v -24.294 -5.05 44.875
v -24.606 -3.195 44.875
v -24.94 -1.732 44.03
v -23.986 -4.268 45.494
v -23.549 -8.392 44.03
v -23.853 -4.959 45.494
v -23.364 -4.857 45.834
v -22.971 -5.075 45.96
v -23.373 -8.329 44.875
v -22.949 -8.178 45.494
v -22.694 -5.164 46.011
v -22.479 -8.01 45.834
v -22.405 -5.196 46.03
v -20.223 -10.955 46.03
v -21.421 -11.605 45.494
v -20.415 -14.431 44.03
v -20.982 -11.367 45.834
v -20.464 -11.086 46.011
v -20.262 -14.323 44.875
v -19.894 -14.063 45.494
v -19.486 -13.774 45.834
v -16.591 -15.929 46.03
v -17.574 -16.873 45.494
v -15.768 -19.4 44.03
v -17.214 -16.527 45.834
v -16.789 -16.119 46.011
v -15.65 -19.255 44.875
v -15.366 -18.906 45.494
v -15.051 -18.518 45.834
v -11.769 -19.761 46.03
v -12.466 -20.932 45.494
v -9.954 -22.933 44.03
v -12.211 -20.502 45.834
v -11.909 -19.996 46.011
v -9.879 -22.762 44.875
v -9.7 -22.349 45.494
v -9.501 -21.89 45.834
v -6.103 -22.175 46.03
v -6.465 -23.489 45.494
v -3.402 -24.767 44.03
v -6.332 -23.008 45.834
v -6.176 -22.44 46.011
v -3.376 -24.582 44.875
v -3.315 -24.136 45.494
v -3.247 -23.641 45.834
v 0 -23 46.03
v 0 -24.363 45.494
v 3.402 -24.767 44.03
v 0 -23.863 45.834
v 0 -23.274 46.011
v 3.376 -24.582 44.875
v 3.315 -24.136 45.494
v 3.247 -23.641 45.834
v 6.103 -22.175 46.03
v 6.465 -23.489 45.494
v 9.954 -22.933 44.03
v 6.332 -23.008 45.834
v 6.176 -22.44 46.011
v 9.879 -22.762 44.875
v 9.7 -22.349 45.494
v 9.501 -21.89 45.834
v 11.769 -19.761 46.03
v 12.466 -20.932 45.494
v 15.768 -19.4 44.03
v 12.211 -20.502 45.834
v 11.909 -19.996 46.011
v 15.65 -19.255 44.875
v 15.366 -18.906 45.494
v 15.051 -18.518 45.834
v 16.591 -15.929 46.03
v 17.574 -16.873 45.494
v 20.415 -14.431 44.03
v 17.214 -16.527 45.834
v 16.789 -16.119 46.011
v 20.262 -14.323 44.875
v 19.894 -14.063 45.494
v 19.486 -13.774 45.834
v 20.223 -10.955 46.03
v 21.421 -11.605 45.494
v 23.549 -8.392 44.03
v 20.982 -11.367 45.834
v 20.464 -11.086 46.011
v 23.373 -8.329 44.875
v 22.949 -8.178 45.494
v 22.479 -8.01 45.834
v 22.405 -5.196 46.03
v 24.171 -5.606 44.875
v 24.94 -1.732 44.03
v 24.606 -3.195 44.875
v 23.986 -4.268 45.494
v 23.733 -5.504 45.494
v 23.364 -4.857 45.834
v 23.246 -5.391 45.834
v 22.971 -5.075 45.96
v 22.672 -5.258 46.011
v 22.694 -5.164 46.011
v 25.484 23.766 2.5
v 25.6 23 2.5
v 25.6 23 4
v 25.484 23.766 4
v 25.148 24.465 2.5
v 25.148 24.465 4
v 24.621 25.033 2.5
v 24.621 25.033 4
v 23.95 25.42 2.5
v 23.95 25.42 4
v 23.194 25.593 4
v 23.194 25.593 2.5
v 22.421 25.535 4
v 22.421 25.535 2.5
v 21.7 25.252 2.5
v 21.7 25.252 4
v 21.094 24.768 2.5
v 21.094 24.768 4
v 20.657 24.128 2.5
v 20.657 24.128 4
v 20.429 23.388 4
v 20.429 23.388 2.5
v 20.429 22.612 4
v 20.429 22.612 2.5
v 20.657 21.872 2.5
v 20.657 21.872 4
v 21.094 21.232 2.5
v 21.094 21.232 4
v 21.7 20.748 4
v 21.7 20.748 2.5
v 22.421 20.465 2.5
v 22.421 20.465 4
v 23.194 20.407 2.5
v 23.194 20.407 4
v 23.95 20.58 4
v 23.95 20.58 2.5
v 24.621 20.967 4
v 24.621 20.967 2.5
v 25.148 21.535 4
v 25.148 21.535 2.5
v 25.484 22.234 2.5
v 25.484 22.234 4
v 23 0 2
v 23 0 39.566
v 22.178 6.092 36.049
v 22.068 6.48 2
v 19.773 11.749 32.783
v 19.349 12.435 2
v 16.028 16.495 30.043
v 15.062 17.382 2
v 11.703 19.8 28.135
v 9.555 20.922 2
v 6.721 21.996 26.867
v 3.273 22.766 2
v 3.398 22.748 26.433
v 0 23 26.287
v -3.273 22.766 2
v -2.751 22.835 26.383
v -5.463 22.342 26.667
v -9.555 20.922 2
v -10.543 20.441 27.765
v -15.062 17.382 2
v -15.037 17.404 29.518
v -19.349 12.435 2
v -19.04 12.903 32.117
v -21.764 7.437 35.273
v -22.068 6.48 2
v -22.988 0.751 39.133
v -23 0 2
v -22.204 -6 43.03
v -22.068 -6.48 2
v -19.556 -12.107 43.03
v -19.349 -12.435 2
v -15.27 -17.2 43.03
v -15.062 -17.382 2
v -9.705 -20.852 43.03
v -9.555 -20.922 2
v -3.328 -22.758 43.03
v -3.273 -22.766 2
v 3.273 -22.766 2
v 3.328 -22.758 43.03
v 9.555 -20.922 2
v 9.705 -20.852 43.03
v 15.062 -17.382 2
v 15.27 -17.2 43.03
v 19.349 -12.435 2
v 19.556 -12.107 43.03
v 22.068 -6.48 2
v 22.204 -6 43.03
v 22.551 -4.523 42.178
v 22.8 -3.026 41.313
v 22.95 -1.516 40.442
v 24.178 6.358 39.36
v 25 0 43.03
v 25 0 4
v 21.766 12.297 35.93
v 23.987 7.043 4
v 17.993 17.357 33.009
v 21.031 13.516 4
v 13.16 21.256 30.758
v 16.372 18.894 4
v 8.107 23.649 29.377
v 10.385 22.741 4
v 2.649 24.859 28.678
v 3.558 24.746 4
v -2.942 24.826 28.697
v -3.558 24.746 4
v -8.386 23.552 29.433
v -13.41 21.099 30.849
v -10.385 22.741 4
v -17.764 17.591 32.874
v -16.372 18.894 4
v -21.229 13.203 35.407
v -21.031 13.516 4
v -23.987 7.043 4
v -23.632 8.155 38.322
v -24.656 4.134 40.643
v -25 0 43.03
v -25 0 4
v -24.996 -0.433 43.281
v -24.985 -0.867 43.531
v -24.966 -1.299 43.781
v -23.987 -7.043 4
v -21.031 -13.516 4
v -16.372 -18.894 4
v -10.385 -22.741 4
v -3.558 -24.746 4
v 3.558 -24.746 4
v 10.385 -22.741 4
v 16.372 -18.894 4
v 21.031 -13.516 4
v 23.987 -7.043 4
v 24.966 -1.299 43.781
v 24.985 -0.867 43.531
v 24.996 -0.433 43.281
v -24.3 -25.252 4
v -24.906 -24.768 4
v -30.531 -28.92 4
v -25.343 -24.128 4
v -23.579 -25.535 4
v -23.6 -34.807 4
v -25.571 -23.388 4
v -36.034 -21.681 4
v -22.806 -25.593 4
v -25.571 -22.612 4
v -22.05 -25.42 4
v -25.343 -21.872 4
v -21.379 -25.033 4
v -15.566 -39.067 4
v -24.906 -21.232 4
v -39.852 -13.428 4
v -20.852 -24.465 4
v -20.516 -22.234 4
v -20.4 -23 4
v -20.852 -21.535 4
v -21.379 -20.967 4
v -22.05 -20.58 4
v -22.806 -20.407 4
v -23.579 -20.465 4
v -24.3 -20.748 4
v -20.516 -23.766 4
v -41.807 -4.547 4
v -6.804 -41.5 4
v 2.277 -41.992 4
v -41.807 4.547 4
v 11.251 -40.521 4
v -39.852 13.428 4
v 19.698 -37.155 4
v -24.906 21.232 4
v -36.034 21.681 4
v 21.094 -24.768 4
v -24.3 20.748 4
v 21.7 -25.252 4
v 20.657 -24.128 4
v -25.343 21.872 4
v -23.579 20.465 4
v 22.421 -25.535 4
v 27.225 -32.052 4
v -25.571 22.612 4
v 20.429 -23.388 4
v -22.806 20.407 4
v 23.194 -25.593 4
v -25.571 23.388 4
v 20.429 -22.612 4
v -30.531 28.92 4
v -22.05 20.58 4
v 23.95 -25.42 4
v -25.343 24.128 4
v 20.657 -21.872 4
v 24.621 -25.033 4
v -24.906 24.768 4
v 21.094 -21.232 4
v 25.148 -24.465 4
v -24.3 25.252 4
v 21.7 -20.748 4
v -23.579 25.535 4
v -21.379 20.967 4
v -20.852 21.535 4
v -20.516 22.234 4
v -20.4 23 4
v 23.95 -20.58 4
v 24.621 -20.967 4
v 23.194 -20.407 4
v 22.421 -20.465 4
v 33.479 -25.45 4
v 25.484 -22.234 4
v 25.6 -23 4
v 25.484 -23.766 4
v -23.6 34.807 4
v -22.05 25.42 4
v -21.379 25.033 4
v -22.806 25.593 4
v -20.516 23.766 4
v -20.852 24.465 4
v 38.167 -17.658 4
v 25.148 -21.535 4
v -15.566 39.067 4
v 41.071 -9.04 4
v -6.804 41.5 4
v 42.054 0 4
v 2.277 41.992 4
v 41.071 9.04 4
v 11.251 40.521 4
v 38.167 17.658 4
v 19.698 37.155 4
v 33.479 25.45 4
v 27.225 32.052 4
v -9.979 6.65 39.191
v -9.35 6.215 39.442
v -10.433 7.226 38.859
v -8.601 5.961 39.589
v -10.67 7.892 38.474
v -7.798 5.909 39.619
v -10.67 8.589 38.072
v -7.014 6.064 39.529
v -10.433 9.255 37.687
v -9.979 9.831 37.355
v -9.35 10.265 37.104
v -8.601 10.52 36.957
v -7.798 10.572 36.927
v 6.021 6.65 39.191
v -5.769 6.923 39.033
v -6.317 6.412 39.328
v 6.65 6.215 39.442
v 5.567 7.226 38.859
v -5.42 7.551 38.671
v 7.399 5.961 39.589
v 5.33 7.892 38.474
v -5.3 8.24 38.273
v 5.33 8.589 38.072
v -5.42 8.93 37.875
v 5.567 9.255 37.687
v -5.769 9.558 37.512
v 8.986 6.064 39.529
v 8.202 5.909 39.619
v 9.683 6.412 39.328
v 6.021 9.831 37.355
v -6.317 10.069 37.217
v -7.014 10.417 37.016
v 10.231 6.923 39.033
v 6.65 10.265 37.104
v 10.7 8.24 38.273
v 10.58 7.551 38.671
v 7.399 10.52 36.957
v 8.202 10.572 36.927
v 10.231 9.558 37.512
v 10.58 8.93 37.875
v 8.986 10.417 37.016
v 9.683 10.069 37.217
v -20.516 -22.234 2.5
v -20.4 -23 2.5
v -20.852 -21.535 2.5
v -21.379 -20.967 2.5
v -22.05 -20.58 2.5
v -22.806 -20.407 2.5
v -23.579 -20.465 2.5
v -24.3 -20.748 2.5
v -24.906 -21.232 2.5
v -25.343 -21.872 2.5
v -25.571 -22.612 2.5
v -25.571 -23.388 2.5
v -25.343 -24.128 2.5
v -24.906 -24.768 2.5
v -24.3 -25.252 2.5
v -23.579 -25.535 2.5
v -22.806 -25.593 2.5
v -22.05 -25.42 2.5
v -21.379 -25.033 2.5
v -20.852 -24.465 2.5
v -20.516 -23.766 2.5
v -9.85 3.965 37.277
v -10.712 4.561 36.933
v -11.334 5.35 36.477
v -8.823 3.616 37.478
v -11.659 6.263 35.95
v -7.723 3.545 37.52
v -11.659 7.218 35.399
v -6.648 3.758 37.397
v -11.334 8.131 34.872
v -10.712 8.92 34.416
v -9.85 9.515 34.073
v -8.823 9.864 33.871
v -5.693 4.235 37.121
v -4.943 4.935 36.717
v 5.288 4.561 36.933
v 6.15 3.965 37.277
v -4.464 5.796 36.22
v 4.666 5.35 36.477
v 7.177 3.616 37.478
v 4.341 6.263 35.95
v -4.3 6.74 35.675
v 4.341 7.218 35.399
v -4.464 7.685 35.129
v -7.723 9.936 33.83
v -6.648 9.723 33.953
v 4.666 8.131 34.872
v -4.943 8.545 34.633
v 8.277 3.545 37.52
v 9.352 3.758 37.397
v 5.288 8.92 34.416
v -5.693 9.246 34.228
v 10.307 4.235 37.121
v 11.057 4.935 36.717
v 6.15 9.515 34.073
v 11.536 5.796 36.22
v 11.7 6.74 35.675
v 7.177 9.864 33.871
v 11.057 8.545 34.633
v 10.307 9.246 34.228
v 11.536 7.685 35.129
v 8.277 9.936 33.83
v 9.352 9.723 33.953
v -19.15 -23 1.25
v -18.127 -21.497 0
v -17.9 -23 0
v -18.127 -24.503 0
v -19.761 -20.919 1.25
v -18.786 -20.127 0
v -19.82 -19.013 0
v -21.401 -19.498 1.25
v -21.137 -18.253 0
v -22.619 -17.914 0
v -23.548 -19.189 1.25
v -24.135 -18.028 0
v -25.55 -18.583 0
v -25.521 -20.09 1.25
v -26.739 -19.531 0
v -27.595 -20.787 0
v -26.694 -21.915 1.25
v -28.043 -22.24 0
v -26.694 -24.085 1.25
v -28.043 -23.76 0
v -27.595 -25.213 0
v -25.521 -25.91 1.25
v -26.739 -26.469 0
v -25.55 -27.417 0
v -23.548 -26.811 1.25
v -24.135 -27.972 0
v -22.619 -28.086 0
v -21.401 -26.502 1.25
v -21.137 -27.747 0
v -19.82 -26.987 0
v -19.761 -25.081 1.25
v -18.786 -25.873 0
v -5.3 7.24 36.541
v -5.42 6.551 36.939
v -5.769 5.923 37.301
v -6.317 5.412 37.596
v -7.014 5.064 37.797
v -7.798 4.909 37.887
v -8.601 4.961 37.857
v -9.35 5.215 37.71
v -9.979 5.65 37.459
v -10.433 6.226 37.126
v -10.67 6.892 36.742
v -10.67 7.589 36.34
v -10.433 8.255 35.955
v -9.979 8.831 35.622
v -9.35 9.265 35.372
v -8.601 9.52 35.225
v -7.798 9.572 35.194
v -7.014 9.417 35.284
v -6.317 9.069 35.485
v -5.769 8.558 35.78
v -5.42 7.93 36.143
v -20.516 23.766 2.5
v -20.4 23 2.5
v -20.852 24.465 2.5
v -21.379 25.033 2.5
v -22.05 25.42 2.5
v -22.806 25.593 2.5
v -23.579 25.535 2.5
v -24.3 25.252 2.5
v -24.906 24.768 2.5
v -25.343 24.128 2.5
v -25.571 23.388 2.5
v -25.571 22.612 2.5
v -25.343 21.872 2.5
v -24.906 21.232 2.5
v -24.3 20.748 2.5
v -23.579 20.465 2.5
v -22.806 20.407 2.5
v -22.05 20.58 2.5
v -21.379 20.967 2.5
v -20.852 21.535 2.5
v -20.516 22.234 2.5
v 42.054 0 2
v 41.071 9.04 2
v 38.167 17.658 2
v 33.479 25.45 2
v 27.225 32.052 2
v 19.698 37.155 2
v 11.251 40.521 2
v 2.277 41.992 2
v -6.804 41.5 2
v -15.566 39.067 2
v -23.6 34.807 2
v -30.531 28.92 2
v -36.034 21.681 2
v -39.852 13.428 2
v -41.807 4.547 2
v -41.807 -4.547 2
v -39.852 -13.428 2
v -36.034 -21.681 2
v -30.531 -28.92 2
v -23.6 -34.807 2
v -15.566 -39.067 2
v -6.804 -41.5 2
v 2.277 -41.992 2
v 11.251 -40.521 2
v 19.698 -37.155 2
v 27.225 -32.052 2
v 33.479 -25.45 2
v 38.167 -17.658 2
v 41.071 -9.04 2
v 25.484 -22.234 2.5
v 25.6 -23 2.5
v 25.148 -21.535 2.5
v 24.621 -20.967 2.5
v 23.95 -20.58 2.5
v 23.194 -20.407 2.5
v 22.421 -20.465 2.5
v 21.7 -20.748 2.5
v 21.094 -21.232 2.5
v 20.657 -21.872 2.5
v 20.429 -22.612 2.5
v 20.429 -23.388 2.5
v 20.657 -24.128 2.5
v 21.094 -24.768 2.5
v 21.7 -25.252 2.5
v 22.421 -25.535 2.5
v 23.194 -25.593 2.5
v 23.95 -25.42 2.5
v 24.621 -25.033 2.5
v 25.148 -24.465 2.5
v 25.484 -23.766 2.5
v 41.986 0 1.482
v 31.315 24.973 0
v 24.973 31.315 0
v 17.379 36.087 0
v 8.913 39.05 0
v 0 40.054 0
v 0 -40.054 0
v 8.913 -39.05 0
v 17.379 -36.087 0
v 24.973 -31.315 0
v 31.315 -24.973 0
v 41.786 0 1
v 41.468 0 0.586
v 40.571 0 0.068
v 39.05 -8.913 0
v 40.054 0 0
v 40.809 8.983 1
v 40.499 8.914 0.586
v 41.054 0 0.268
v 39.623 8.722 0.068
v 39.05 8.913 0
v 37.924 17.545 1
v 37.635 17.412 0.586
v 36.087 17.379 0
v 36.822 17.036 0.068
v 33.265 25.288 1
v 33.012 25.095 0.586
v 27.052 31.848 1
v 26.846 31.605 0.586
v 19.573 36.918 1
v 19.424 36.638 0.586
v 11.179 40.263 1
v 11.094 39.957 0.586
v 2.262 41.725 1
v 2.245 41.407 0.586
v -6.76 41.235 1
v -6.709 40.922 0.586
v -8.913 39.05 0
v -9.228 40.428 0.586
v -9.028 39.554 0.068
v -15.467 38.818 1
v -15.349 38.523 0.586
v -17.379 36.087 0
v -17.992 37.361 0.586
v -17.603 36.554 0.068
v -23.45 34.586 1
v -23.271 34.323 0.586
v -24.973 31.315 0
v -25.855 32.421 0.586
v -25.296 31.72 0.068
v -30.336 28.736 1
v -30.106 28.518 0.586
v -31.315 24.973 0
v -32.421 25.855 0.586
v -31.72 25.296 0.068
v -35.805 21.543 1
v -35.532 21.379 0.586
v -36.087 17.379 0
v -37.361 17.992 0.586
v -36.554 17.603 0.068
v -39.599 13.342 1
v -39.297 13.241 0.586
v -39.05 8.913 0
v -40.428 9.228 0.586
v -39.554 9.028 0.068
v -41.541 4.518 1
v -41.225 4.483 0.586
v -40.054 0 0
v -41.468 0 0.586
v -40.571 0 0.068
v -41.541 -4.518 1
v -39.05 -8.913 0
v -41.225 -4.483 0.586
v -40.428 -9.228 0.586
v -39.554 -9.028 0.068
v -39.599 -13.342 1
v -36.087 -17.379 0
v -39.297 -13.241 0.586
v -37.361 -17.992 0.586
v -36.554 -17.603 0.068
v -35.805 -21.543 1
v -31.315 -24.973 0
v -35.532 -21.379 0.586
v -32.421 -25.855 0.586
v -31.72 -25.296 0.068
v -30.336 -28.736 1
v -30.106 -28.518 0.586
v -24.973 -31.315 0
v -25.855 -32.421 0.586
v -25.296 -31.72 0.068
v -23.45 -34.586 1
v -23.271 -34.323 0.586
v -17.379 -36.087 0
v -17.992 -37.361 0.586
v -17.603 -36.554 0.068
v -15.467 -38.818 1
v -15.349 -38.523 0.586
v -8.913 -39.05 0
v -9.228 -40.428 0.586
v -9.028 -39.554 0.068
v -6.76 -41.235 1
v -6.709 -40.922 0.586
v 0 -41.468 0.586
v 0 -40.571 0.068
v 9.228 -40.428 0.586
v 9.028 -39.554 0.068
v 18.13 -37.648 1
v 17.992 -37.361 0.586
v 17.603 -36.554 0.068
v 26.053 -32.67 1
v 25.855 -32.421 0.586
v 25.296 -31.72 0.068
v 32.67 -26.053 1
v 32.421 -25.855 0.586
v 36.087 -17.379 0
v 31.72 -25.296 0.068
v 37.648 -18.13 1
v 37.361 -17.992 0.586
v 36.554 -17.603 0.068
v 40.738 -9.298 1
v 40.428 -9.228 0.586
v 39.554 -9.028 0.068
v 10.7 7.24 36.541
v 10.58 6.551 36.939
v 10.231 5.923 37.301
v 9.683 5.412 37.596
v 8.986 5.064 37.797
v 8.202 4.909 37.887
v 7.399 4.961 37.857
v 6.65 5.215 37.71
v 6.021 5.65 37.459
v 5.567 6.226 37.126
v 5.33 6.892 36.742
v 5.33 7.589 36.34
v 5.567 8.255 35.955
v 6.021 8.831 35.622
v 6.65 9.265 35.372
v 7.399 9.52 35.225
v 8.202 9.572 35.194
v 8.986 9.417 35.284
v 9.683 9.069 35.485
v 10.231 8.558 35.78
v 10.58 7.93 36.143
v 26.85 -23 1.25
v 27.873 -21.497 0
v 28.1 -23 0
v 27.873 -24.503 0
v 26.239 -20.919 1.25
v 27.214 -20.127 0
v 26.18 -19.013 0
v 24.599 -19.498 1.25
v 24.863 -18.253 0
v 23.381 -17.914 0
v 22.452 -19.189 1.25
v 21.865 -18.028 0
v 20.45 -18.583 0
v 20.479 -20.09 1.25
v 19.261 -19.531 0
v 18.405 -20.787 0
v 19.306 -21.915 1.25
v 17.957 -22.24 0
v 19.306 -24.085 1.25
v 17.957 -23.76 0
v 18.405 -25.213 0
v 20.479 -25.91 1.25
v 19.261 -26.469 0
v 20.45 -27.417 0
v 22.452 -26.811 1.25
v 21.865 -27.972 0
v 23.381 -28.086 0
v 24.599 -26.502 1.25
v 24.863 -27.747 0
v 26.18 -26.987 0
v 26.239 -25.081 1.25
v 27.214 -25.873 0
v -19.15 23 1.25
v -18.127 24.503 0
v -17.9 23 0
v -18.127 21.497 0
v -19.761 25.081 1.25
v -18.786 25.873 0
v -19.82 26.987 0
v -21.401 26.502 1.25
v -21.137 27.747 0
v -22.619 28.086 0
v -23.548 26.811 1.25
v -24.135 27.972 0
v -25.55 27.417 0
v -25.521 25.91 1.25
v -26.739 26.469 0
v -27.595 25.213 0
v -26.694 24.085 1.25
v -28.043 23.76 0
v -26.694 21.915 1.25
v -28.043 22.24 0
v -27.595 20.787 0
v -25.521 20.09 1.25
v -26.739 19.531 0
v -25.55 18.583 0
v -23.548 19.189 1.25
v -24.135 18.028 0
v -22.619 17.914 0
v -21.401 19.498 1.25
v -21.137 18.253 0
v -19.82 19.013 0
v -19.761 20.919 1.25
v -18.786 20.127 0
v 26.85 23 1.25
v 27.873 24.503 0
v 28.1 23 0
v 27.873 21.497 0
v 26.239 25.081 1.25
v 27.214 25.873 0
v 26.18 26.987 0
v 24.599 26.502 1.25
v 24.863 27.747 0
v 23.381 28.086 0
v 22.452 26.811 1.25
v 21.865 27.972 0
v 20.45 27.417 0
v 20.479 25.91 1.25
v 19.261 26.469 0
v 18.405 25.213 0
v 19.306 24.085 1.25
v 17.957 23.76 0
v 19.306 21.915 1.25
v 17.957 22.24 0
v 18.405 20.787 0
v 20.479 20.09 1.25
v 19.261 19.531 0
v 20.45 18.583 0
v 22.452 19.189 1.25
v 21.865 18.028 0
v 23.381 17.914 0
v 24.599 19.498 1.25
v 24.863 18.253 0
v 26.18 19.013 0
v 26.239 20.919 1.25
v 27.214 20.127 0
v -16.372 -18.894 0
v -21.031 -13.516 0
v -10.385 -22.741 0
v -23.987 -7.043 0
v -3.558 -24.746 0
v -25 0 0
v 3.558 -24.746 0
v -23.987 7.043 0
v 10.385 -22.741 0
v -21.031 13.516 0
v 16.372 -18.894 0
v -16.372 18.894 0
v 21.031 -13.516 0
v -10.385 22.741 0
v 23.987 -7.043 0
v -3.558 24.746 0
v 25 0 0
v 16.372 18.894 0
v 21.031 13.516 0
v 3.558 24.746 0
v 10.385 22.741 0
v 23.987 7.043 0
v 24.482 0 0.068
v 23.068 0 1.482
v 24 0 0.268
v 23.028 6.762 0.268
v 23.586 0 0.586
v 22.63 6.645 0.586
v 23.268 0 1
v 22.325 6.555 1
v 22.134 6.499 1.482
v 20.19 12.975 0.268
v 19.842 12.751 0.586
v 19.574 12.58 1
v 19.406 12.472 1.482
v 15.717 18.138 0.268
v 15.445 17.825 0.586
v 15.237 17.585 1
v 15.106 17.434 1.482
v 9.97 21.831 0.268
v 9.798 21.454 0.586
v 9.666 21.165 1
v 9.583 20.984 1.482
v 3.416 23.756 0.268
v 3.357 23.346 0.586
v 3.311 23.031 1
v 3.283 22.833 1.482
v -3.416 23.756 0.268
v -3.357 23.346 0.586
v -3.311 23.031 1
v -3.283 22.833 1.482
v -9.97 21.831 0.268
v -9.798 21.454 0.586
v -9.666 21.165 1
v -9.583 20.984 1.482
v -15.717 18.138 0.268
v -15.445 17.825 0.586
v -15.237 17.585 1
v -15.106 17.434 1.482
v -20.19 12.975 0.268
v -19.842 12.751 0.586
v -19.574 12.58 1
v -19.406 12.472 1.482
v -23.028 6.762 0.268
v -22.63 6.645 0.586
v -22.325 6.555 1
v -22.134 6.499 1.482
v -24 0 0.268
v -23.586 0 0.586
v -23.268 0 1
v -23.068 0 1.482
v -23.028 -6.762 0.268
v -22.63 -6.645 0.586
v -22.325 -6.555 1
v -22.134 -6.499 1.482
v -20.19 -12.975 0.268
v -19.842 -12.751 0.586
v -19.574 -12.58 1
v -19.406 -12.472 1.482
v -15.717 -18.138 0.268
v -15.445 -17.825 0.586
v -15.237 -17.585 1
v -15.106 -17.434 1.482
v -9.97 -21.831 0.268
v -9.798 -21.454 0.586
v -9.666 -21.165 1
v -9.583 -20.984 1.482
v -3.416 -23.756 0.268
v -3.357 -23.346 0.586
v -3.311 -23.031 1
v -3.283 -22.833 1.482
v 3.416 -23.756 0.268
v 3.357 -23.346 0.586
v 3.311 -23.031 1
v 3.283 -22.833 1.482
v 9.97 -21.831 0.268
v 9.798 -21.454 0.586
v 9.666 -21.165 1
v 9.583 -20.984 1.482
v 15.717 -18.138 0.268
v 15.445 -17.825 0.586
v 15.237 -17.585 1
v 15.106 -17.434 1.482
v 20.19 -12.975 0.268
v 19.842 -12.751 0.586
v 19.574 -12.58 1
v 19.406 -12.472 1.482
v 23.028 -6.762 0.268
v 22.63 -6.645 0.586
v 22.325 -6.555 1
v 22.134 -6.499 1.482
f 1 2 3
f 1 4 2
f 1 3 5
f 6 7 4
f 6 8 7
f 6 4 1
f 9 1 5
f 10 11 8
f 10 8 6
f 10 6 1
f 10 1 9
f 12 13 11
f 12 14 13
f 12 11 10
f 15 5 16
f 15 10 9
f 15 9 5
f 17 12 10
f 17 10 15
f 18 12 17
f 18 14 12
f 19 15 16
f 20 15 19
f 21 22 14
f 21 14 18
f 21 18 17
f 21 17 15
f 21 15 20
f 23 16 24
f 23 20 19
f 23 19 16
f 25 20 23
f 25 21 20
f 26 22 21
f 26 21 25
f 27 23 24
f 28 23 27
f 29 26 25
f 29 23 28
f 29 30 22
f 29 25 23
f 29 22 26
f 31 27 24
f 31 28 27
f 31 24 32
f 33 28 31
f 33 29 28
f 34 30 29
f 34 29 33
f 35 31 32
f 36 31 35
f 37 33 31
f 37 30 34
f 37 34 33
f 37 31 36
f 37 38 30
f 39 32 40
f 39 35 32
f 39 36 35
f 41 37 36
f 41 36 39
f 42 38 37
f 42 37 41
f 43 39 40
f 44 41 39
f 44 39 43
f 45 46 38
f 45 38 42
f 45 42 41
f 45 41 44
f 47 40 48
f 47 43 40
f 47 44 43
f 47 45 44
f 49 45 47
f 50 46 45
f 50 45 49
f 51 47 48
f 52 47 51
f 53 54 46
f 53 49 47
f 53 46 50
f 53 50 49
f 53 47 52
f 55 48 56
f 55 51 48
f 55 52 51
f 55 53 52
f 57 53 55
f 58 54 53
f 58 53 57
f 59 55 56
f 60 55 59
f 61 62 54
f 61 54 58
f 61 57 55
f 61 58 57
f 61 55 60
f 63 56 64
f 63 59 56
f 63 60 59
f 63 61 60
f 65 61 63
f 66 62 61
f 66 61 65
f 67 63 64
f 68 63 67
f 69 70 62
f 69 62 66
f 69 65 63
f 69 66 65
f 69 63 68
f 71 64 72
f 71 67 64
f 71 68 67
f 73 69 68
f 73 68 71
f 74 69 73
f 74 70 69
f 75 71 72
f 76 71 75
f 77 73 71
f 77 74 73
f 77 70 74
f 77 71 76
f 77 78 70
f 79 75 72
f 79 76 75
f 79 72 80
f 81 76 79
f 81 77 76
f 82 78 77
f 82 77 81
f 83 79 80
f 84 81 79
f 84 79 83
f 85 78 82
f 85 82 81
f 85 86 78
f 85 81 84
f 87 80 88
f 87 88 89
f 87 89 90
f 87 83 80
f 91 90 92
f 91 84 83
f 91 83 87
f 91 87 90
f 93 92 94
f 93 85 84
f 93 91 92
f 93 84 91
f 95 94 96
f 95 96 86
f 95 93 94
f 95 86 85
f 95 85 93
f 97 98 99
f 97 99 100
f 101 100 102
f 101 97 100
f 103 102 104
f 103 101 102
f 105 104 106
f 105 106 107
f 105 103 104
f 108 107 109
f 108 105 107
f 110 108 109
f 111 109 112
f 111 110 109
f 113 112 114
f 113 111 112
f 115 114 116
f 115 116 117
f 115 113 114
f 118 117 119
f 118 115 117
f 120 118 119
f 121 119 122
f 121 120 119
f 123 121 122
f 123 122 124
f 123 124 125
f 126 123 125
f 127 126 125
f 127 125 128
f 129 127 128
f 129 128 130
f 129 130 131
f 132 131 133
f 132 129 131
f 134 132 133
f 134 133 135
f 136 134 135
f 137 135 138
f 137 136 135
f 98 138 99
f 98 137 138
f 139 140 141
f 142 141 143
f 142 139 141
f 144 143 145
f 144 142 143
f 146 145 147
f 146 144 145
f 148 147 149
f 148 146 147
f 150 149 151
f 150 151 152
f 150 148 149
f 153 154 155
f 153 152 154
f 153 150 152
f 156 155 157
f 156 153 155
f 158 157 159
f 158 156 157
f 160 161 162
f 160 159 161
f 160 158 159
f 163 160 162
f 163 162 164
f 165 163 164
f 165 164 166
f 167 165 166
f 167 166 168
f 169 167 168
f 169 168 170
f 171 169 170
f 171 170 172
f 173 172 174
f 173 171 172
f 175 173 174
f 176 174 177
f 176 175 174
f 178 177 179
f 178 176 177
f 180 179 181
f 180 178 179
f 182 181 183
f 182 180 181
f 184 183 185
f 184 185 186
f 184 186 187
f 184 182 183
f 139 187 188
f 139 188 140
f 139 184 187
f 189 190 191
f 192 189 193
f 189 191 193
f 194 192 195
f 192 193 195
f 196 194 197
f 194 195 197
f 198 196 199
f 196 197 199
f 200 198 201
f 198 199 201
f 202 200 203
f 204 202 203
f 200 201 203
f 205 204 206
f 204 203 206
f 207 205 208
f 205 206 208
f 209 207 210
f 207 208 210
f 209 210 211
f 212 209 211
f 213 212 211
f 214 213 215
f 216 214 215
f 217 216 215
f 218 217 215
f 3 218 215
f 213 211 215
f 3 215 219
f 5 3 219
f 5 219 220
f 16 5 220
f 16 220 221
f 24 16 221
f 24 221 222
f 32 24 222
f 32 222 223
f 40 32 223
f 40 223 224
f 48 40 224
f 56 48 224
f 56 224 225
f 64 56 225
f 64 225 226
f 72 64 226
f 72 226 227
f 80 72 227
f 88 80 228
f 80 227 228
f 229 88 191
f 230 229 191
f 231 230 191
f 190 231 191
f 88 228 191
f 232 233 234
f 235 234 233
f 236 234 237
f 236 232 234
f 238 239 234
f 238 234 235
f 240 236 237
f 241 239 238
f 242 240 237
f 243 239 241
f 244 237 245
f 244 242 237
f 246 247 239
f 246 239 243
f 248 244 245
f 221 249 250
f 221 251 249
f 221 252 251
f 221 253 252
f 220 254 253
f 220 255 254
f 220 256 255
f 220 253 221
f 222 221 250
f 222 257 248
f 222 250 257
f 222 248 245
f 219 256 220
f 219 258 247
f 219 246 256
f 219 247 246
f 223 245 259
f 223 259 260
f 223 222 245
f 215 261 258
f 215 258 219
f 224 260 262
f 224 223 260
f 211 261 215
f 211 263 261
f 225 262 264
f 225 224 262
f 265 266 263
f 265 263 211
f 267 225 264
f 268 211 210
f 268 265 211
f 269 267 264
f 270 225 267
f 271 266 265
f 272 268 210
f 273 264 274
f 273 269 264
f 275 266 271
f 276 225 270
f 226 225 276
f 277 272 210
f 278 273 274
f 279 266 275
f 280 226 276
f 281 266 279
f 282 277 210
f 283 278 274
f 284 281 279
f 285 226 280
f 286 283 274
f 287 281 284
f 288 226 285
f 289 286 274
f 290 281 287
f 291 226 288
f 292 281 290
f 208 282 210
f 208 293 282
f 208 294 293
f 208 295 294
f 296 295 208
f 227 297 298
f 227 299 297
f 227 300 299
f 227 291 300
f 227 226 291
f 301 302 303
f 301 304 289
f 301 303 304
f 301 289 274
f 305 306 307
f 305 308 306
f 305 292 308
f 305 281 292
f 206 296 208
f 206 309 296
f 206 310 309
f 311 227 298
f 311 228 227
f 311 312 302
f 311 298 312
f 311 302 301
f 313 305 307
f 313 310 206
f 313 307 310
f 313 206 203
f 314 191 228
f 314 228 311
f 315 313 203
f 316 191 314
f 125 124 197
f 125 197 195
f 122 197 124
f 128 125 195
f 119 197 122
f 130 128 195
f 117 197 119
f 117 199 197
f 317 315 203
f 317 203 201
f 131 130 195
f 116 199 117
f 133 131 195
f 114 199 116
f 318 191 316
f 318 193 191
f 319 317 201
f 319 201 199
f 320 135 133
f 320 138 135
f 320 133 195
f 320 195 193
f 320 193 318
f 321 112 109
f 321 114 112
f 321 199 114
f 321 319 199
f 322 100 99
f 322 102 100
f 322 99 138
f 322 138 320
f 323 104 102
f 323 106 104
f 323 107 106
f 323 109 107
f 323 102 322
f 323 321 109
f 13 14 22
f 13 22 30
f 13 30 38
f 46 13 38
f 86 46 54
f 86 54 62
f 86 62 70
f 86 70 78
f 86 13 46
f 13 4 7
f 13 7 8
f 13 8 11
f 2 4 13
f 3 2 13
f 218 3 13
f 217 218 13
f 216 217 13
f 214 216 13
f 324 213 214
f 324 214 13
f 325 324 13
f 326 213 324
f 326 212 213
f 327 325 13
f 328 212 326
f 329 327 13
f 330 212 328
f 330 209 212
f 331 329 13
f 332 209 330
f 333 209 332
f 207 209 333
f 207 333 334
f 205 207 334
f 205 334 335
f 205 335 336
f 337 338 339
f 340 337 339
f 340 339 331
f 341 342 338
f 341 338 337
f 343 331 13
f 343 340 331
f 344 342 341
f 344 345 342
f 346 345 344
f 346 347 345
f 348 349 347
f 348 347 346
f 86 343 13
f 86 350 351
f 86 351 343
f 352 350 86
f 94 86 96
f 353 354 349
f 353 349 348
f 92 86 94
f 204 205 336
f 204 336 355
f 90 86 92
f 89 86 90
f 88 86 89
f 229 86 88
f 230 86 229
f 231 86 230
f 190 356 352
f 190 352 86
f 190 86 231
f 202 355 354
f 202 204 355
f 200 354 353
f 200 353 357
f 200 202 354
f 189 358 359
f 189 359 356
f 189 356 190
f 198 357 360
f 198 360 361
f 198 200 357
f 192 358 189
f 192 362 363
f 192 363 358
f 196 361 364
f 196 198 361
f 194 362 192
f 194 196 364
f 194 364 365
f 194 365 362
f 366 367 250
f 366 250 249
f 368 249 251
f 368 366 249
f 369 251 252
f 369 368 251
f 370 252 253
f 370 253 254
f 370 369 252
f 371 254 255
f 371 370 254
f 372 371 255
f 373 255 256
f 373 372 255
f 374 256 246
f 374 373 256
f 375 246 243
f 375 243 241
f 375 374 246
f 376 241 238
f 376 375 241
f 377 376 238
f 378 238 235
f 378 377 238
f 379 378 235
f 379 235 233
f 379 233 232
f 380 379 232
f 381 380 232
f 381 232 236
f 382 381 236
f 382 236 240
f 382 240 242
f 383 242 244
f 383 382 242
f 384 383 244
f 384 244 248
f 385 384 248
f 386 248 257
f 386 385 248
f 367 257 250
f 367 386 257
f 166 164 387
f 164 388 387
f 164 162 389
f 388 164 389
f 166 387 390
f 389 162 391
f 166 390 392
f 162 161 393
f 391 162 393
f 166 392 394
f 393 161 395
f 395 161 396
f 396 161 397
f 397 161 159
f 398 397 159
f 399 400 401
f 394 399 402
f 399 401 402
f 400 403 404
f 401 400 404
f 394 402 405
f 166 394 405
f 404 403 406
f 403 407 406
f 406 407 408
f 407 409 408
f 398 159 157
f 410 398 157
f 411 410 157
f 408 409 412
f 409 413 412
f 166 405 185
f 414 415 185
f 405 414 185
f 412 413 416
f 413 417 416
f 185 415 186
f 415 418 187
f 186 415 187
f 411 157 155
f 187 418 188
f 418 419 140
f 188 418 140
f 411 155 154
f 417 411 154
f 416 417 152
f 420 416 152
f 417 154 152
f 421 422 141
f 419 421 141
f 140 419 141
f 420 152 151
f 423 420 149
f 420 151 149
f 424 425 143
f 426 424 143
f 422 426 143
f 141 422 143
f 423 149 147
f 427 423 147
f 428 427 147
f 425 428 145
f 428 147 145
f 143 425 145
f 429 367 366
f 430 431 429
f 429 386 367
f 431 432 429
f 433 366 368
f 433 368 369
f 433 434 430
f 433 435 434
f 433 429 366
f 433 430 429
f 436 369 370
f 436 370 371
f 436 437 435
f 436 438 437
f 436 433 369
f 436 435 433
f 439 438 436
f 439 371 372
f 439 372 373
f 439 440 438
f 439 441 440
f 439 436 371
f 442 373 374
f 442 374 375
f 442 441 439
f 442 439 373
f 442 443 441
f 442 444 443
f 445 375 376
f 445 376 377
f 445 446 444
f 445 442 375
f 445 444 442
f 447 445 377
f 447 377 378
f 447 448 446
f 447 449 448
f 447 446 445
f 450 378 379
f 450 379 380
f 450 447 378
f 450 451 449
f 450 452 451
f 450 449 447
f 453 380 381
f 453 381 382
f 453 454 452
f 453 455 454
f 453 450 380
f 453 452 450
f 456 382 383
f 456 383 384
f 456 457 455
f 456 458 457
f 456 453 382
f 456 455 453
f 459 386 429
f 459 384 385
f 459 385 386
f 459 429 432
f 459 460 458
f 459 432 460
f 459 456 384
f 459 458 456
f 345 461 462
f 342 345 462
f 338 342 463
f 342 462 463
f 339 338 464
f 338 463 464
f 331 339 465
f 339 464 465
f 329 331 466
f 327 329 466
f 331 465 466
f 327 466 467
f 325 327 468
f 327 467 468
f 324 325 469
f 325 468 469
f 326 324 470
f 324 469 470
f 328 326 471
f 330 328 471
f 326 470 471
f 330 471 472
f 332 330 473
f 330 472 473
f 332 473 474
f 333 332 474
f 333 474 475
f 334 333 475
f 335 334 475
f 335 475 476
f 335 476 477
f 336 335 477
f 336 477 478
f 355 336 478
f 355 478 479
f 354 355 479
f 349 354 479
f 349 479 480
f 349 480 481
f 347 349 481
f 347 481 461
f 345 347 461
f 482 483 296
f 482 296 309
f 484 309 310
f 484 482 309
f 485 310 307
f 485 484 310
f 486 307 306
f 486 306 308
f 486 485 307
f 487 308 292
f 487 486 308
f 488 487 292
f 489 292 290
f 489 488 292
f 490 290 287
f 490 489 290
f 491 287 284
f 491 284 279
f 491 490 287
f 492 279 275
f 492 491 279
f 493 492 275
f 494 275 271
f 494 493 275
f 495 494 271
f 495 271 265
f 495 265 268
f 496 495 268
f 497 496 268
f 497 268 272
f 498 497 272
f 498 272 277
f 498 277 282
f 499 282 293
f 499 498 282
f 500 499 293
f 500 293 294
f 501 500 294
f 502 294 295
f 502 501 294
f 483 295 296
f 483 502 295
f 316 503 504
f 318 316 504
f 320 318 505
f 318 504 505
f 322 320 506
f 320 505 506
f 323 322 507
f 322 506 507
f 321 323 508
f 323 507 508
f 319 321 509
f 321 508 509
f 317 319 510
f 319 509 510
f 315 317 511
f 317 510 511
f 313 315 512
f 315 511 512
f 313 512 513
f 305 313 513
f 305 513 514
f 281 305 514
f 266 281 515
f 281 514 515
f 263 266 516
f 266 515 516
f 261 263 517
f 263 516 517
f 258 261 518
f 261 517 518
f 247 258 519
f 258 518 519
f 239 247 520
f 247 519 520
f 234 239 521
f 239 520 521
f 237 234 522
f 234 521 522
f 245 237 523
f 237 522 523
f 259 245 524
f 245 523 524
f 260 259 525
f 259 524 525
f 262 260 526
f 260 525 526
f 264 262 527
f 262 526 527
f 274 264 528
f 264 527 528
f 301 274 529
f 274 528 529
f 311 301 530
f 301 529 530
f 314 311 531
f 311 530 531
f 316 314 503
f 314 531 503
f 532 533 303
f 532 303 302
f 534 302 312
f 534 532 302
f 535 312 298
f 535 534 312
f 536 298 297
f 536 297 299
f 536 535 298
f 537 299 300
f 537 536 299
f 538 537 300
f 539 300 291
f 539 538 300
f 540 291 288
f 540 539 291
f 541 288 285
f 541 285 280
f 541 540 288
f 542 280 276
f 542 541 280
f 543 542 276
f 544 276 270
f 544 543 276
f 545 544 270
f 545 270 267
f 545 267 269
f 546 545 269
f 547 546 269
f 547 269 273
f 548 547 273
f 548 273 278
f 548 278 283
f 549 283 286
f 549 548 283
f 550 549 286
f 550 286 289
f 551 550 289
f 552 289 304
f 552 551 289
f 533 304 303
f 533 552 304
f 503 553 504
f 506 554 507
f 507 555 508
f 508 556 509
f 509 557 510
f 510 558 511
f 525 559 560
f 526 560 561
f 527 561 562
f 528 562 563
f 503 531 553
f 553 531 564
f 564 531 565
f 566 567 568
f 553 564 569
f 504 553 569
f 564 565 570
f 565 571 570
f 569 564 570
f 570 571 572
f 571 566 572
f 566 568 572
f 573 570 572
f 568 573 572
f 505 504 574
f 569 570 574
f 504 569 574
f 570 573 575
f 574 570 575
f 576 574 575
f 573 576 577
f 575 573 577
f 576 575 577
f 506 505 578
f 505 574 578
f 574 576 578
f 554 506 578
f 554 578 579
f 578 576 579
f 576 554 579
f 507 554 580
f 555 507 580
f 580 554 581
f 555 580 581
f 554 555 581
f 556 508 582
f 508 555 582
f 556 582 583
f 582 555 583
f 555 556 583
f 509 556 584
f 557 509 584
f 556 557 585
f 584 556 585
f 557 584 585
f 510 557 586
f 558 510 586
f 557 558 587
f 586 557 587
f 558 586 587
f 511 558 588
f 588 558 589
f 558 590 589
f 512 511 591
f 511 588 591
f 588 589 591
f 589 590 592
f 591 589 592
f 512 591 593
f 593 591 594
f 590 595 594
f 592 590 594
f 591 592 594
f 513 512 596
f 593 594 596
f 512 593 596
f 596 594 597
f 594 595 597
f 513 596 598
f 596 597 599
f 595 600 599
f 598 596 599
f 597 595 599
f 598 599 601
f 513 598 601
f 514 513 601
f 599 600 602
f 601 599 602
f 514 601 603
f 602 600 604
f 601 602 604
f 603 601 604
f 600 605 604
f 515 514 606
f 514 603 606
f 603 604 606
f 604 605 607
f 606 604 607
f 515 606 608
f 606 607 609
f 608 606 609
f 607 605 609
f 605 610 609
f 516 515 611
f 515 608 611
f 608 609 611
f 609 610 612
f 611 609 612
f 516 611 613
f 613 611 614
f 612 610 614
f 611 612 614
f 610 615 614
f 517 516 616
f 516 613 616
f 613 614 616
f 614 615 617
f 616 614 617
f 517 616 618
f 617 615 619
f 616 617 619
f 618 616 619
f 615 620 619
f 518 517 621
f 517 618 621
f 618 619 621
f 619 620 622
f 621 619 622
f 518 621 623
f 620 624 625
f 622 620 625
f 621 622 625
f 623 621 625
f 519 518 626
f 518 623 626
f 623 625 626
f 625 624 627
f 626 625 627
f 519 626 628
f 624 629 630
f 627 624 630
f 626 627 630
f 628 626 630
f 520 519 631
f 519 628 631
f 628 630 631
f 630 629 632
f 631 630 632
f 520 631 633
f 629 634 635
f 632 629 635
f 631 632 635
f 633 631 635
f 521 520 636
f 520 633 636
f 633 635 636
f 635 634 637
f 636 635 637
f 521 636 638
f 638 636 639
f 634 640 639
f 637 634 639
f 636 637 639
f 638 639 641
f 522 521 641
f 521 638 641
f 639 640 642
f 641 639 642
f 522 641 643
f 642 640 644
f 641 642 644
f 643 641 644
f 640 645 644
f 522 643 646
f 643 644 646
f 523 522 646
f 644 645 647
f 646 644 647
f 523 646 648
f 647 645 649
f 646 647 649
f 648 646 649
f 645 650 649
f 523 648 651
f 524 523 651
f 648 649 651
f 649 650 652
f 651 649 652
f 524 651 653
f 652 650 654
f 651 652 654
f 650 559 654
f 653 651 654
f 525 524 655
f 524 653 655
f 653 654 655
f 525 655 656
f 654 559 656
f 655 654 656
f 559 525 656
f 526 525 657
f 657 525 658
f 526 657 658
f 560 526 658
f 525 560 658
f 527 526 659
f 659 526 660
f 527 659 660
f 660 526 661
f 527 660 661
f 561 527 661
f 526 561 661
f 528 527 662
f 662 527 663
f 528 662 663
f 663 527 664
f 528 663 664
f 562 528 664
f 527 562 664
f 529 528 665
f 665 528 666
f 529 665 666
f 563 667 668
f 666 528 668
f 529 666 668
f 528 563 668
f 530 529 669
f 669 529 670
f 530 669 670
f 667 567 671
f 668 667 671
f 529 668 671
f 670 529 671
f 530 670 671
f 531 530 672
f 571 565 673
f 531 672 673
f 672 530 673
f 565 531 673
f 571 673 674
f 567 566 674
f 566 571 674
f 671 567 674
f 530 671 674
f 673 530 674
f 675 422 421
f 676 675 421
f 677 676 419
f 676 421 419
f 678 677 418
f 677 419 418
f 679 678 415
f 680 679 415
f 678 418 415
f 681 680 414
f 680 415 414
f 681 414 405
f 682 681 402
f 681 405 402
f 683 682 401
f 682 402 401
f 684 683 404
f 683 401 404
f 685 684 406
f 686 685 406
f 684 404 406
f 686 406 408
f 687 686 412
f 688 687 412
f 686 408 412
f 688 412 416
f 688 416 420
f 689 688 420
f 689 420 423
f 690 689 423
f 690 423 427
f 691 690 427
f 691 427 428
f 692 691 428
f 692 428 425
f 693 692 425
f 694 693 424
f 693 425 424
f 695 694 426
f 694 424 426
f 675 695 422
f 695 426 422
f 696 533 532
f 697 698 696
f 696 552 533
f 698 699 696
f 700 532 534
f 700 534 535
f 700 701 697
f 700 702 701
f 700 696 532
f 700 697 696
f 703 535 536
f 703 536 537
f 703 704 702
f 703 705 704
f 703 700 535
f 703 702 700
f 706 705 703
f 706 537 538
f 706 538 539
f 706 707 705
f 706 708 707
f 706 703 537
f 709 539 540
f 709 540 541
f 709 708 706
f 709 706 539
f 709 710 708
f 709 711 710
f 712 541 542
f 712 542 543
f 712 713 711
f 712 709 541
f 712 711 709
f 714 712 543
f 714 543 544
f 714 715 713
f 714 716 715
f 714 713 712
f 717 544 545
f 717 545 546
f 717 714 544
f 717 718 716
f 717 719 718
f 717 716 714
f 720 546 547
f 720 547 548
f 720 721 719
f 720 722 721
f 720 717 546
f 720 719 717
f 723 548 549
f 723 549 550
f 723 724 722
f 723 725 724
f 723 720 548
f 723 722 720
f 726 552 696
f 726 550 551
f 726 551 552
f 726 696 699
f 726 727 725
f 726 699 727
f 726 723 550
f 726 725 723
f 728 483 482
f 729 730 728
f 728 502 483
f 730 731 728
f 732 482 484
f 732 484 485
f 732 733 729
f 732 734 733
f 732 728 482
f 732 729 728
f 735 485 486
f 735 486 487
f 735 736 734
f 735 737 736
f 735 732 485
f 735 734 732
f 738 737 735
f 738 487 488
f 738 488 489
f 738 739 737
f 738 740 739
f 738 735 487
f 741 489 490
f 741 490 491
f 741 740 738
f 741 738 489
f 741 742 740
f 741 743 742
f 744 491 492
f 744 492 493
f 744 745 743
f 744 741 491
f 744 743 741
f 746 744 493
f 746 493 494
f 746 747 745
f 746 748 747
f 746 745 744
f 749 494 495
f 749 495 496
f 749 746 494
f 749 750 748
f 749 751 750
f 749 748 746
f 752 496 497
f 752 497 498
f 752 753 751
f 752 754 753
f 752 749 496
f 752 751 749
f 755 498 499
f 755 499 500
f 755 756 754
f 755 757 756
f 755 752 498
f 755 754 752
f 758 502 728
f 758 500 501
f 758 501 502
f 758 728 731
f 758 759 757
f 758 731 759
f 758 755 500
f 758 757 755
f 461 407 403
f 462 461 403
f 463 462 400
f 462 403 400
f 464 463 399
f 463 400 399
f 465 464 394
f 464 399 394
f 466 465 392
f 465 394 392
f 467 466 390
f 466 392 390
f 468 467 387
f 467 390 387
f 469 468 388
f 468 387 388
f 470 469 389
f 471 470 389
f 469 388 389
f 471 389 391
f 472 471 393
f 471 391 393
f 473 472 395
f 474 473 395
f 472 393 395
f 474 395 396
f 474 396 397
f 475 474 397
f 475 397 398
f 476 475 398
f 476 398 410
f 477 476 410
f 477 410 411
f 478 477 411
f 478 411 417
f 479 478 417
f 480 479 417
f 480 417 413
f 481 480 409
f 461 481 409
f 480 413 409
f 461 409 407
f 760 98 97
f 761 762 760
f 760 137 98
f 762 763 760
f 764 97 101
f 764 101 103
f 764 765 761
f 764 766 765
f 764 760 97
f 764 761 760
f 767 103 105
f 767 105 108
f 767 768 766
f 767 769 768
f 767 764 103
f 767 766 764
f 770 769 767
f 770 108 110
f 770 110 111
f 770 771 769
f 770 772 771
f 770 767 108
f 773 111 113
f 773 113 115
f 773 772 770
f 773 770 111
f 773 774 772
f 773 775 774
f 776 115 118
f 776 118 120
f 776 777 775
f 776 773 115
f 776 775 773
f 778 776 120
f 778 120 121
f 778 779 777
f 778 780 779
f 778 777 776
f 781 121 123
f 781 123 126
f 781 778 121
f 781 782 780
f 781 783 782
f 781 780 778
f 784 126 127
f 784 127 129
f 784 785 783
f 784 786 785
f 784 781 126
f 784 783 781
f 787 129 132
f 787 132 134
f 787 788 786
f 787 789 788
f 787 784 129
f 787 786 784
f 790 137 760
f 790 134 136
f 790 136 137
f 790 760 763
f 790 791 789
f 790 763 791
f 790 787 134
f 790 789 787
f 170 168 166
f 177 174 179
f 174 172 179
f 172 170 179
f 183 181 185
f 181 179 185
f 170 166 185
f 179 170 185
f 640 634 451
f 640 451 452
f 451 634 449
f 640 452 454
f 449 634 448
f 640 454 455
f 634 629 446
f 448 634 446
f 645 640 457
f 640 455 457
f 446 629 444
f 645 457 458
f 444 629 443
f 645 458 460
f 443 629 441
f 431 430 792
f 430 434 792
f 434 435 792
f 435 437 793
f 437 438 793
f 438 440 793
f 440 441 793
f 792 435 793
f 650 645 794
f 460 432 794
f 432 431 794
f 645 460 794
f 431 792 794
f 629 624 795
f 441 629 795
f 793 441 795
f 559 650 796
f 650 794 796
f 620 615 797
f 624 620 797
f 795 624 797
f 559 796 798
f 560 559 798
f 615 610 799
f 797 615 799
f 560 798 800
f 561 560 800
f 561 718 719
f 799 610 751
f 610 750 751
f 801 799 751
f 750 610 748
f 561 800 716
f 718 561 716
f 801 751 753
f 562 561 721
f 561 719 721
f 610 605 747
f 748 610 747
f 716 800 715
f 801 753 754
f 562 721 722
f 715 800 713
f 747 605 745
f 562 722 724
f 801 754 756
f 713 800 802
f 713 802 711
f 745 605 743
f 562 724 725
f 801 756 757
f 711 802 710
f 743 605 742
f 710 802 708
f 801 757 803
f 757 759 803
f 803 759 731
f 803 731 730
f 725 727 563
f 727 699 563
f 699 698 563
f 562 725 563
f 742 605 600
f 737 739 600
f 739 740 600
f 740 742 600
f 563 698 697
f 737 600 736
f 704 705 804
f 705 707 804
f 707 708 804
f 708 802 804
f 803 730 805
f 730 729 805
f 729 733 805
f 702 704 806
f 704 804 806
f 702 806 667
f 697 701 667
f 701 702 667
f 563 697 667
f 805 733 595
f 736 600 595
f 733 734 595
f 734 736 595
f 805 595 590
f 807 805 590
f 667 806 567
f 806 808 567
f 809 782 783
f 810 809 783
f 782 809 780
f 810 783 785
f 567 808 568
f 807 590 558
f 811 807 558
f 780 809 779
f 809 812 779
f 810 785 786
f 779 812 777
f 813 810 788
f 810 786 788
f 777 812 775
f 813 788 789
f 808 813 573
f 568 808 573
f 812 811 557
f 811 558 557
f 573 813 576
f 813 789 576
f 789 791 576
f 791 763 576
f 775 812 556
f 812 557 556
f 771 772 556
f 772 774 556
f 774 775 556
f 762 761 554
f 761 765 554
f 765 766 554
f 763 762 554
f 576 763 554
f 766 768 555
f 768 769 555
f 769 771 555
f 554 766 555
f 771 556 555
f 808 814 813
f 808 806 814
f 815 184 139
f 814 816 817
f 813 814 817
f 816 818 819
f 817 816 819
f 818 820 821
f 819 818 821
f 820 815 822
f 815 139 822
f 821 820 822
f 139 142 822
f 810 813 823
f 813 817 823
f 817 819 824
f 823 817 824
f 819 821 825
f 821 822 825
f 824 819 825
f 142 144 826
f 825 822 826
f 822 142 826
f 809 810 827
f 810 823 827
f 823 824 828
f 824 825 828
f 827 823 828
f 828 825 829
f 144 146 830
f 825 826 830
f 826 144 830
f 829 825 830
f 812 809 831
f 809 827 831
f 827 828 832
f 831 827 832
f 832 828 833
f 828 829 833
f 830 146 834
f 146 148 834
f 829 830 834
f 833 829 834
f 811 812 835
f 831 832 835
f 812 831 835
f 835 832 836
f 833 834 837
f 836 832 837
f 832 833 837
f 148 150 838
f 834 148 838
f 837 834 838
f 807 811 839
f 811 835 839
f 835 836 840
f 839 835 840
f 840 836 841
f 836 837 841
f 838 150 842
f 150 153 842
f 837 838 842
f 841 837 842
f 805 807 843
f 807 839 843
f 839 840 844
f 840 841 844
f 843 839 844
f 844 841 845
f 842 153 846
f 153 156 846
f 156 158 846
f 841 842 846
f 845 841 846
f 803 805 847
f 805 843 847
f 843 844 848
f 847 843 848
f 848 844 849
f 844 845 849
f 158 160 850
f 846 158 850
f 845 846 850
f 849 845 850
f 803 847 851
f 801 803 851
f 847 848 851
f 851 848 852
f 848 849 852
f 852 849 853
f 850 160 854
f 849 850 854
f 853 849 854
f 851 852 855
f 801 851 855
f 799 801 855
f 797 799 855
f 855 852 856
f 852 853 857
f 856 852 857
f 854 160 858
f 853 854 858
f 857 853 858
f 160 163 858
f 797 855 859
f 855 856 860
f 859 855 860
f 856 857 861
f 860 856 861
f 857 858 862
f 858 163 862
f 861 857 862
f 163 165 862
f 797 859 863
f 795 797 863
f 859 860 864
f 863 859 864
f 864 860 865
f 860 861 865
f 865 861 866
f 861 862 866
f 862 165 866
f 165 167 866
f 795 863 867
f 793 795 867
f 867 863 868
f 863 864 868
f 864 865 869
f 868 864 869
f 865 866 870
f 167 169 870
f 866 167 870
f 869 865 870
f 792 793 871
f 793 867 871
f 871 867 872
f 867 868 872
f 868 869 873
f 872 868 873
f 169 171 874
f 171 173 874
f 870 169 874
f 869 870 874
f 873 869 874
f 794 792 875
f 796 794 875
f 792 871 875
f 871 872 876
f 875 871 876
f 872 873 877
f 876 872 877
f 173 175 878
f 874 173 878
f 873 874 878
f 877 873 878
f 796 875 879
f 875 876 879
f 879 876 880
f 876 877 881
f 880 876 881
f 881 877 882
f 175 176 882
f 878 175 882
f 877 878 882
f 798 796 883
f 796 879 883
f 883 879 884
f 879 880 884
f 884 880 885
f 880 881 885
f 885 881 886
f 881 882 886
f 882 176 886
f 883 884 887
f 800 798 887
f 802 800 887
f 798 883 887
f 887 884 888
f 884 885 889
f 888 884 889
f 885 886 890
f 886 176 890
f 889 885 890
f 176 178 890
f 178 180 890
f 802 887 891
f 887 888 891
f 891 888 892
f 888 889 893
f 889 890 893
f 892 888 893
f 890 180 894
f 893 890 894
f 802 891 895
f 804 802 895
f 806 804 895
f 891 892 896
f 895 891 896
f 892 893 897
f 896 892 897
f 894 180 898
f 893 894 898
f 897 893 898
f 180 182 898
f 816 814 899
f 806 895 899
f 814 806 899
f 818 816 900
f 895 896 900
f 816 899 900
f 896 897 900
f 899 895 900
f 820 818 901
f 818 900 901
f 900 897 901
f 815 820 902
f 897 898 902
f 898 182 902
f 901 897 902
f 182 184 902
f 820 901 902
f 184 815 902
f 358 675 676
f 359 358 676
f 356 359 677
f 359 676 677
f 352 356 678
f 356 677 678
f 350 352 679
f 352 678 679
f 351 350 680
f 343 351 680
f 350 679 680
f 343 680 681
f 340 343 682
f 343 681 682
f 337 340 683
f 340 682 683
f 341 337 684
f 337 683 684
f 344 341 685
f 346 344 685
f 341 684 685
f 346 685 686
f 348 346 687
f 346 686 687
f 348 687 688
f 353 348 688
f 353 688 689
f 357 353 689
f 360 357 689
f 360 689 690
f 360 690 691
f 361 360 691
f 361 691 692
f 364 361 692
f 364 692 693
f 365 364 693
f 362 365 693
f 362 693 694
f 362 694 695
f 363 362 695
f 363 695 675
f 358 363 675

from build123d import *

# Parameters (mm, degrees)
SKETCH_R          = 42.0538238692
SKETCH_R_2        = 23
SKETCH_R_3        = 2.6
PAD_DEPTH         = 4
SKETCH001_R       = 25
SKETCH001_R_2     = 23
PAD001_DEPTH      = 50
POCKET_DEPTH      = 25
POCKET_DEPTH_BACK = 25
SKETCH003_R       = 31
PAD002_DEPTH      = 3
SKETCH004_R       = 42.0538238692
SKETCH004_R_2     = 25
POCKET001_DEPTH   = 55
SKETCH005_R       = 2.7
POCKET002_DEPTH   = 5
SKETCH006_W       = 30
SKETCH006_H       = 20
POCKET003_DEPTH   = 25.5
PAD003_DEPTH      = 3
SKETCH008_W       = 50
SKETCH008_H       = 10
POCKET004_DEPTH   = 7
FILLET_R          = 2
CHAMFER_SIZE      = 1
CHAMFER001_SIZE   = 2.5


with BuildPart() as part:
    # Sketch → Pad (new body)
    with BuildSketch(Plane.XY):
        Circle(SKETCH_R)
        Circle(SKETCH_R_2, mode=Mode.SUBTRACT)
        with Locations((-23, 23)):
            Circle(SKETCH_R_3, mode=Mode.SUBTRACT)
        with Locations((23, 23)):
            Circle(SKETCH_R_3, mode=Mode.SUBTRACT)
        with Locations((23, -23)):
            Circle(SKETCH_R_3, mode=Mode.SUBTRACT)
        with Locations((-23, -23)):
            Circle(SKETCH_R_3, mode=Mode.SUBTRACT)
    extrude(amount=PAD_DEPTH)

    # Sketch001 (on Face8 of Pad) → Pad001 (join)
    with BuildSketch(Plane.XY.offset(4)):
        Circle(SKETCH001_R)
        Circle(SKETCH001_R_2, mode=Mode.SUBTRACT)
    extrude(amount=PAD001_DEPTH)

    # Sketch002 → Pocket (cut, two sides)
    with BuildSketch(Plane.YZ) as pocket_sk:
        Polygon((-25, 54), (25, 25.1324865414), (25, 54), align=None)
    extrude(amount=-POCKET_DEPTH, mode=Mode.SUBTRACT)
    extrude(pocket_sk.sketch, amount=POCKET_DEPTH_BACK, mode=Mode.SUBTRACT)

    # Sketch003 (on Face11 of Pocket) → Pad002 (join)
    with BuildSketch(Plane(origin=(0, 17.1326859021, 29.6746824535), x_dir=(1, 0, 0), z_dir=(0, 0.5, 0.8660254038))):
        with Locations((0, -19.7831216349)):
            Circle(SKETCH003_R)
    extrude(amount=PAD002_DEPTH)

    # Sketch004 (on Face5 of Pad002) → Pocket001 (cut)
    with BuildSketch(Plane.XY.offset(4)):
        Circle(SKETCH004_R)
        Circle(SKETCH004_R_2, mode=Mode.SUBTRACT)
    extrude(amount=POCKET001_DEPTH, mode=Mode.SUBTRACT)

    # Sketch005 (on Face13 of Pocket001) → Pocket002 (cut)
    with BuildSketch(Plane(origin=(0, 17.1326859021, 29.6746824535), x_dir=(1, 0, 0), z_dir=(0, -0.5, -0.8660254038))):
        with Locations((-8, 12)):
            Circle(SKETCH005_R)
        with Locations((8, 12)):
            Circle(SKETCH005_R)
    extrude(amount=-POCKET002_DEPTH, mode=Mode.SUBTRACT)

    # Sketch006 → Pocket003 (cut, symmetric)
    with BuildSketch(Plane.YZ):
        with Locations((-15, 53.0303448858)):
            Rectangle(SKETCH006_W, SKETCH006_H)
    extrude(amount=POCKET003_DEPTH, both=True, mode=Mode.SUBTRACT)

    # Sketch007 (on Face4 of Pocket003) → Pad003 (join)
    with BuildSketch(Plane.XY.offset(43.0303448858)):
        with BuildLine():
            ThreePointArc((-25, 0), (0, -25), (25, 0))
            Line((-25, 0), (25, 0))
        make_face()
    extrude(amount=PAD003_DEPTH)

    # Sketch008 (on Face13 of Pad003) → Pocket004 (cut)
    with BuildSketch(Plane(origin=(0, 18.6326859021, 32.2727586649), x_dir=(1, 0, 0), z_dir=(0, 0.5, 0.8660254038))):
        with Locations((0, -26.5151724424)):
            Rectangle(SKETCH008_W, SKETCH008_H)
    extrude(amount=POCKET004_DEPTH, mode=Mode.SUBTRACT)

    # Fillet
    fillet_edges = [part.edges().sort_by_distance(p)[0] for p in [
        (-23, 0, 0),
        (-42.053824, 0, 0),
        (0, -25, 46.030345),
    ]]
    fillet(fillet_edges, radius=FILLET_R)

    # Chamfer
    chamfer_edges = [part.edges().sort_by_distance(p)[0] for p in [
        (5.3, 6.740381, 35.674682),
        (-10.7, 6.740381, 35.674682),
    ]]
    chamfer(chamfer_edges, length=CHAMFER_SIZE)

    # Chamfer001
    chamfer001_edges = [part.edges().sort_by_distance(p)[0] for p in [
        (20.4, -23, 0),
        (20.4, 23, 0),
        (-25.6, 23, 0),
        (-25.6, -23, 0),
    ]]
    chamfer(chamfer001_edges, length=CHAMFER001_SIZE)


solid = part.part
